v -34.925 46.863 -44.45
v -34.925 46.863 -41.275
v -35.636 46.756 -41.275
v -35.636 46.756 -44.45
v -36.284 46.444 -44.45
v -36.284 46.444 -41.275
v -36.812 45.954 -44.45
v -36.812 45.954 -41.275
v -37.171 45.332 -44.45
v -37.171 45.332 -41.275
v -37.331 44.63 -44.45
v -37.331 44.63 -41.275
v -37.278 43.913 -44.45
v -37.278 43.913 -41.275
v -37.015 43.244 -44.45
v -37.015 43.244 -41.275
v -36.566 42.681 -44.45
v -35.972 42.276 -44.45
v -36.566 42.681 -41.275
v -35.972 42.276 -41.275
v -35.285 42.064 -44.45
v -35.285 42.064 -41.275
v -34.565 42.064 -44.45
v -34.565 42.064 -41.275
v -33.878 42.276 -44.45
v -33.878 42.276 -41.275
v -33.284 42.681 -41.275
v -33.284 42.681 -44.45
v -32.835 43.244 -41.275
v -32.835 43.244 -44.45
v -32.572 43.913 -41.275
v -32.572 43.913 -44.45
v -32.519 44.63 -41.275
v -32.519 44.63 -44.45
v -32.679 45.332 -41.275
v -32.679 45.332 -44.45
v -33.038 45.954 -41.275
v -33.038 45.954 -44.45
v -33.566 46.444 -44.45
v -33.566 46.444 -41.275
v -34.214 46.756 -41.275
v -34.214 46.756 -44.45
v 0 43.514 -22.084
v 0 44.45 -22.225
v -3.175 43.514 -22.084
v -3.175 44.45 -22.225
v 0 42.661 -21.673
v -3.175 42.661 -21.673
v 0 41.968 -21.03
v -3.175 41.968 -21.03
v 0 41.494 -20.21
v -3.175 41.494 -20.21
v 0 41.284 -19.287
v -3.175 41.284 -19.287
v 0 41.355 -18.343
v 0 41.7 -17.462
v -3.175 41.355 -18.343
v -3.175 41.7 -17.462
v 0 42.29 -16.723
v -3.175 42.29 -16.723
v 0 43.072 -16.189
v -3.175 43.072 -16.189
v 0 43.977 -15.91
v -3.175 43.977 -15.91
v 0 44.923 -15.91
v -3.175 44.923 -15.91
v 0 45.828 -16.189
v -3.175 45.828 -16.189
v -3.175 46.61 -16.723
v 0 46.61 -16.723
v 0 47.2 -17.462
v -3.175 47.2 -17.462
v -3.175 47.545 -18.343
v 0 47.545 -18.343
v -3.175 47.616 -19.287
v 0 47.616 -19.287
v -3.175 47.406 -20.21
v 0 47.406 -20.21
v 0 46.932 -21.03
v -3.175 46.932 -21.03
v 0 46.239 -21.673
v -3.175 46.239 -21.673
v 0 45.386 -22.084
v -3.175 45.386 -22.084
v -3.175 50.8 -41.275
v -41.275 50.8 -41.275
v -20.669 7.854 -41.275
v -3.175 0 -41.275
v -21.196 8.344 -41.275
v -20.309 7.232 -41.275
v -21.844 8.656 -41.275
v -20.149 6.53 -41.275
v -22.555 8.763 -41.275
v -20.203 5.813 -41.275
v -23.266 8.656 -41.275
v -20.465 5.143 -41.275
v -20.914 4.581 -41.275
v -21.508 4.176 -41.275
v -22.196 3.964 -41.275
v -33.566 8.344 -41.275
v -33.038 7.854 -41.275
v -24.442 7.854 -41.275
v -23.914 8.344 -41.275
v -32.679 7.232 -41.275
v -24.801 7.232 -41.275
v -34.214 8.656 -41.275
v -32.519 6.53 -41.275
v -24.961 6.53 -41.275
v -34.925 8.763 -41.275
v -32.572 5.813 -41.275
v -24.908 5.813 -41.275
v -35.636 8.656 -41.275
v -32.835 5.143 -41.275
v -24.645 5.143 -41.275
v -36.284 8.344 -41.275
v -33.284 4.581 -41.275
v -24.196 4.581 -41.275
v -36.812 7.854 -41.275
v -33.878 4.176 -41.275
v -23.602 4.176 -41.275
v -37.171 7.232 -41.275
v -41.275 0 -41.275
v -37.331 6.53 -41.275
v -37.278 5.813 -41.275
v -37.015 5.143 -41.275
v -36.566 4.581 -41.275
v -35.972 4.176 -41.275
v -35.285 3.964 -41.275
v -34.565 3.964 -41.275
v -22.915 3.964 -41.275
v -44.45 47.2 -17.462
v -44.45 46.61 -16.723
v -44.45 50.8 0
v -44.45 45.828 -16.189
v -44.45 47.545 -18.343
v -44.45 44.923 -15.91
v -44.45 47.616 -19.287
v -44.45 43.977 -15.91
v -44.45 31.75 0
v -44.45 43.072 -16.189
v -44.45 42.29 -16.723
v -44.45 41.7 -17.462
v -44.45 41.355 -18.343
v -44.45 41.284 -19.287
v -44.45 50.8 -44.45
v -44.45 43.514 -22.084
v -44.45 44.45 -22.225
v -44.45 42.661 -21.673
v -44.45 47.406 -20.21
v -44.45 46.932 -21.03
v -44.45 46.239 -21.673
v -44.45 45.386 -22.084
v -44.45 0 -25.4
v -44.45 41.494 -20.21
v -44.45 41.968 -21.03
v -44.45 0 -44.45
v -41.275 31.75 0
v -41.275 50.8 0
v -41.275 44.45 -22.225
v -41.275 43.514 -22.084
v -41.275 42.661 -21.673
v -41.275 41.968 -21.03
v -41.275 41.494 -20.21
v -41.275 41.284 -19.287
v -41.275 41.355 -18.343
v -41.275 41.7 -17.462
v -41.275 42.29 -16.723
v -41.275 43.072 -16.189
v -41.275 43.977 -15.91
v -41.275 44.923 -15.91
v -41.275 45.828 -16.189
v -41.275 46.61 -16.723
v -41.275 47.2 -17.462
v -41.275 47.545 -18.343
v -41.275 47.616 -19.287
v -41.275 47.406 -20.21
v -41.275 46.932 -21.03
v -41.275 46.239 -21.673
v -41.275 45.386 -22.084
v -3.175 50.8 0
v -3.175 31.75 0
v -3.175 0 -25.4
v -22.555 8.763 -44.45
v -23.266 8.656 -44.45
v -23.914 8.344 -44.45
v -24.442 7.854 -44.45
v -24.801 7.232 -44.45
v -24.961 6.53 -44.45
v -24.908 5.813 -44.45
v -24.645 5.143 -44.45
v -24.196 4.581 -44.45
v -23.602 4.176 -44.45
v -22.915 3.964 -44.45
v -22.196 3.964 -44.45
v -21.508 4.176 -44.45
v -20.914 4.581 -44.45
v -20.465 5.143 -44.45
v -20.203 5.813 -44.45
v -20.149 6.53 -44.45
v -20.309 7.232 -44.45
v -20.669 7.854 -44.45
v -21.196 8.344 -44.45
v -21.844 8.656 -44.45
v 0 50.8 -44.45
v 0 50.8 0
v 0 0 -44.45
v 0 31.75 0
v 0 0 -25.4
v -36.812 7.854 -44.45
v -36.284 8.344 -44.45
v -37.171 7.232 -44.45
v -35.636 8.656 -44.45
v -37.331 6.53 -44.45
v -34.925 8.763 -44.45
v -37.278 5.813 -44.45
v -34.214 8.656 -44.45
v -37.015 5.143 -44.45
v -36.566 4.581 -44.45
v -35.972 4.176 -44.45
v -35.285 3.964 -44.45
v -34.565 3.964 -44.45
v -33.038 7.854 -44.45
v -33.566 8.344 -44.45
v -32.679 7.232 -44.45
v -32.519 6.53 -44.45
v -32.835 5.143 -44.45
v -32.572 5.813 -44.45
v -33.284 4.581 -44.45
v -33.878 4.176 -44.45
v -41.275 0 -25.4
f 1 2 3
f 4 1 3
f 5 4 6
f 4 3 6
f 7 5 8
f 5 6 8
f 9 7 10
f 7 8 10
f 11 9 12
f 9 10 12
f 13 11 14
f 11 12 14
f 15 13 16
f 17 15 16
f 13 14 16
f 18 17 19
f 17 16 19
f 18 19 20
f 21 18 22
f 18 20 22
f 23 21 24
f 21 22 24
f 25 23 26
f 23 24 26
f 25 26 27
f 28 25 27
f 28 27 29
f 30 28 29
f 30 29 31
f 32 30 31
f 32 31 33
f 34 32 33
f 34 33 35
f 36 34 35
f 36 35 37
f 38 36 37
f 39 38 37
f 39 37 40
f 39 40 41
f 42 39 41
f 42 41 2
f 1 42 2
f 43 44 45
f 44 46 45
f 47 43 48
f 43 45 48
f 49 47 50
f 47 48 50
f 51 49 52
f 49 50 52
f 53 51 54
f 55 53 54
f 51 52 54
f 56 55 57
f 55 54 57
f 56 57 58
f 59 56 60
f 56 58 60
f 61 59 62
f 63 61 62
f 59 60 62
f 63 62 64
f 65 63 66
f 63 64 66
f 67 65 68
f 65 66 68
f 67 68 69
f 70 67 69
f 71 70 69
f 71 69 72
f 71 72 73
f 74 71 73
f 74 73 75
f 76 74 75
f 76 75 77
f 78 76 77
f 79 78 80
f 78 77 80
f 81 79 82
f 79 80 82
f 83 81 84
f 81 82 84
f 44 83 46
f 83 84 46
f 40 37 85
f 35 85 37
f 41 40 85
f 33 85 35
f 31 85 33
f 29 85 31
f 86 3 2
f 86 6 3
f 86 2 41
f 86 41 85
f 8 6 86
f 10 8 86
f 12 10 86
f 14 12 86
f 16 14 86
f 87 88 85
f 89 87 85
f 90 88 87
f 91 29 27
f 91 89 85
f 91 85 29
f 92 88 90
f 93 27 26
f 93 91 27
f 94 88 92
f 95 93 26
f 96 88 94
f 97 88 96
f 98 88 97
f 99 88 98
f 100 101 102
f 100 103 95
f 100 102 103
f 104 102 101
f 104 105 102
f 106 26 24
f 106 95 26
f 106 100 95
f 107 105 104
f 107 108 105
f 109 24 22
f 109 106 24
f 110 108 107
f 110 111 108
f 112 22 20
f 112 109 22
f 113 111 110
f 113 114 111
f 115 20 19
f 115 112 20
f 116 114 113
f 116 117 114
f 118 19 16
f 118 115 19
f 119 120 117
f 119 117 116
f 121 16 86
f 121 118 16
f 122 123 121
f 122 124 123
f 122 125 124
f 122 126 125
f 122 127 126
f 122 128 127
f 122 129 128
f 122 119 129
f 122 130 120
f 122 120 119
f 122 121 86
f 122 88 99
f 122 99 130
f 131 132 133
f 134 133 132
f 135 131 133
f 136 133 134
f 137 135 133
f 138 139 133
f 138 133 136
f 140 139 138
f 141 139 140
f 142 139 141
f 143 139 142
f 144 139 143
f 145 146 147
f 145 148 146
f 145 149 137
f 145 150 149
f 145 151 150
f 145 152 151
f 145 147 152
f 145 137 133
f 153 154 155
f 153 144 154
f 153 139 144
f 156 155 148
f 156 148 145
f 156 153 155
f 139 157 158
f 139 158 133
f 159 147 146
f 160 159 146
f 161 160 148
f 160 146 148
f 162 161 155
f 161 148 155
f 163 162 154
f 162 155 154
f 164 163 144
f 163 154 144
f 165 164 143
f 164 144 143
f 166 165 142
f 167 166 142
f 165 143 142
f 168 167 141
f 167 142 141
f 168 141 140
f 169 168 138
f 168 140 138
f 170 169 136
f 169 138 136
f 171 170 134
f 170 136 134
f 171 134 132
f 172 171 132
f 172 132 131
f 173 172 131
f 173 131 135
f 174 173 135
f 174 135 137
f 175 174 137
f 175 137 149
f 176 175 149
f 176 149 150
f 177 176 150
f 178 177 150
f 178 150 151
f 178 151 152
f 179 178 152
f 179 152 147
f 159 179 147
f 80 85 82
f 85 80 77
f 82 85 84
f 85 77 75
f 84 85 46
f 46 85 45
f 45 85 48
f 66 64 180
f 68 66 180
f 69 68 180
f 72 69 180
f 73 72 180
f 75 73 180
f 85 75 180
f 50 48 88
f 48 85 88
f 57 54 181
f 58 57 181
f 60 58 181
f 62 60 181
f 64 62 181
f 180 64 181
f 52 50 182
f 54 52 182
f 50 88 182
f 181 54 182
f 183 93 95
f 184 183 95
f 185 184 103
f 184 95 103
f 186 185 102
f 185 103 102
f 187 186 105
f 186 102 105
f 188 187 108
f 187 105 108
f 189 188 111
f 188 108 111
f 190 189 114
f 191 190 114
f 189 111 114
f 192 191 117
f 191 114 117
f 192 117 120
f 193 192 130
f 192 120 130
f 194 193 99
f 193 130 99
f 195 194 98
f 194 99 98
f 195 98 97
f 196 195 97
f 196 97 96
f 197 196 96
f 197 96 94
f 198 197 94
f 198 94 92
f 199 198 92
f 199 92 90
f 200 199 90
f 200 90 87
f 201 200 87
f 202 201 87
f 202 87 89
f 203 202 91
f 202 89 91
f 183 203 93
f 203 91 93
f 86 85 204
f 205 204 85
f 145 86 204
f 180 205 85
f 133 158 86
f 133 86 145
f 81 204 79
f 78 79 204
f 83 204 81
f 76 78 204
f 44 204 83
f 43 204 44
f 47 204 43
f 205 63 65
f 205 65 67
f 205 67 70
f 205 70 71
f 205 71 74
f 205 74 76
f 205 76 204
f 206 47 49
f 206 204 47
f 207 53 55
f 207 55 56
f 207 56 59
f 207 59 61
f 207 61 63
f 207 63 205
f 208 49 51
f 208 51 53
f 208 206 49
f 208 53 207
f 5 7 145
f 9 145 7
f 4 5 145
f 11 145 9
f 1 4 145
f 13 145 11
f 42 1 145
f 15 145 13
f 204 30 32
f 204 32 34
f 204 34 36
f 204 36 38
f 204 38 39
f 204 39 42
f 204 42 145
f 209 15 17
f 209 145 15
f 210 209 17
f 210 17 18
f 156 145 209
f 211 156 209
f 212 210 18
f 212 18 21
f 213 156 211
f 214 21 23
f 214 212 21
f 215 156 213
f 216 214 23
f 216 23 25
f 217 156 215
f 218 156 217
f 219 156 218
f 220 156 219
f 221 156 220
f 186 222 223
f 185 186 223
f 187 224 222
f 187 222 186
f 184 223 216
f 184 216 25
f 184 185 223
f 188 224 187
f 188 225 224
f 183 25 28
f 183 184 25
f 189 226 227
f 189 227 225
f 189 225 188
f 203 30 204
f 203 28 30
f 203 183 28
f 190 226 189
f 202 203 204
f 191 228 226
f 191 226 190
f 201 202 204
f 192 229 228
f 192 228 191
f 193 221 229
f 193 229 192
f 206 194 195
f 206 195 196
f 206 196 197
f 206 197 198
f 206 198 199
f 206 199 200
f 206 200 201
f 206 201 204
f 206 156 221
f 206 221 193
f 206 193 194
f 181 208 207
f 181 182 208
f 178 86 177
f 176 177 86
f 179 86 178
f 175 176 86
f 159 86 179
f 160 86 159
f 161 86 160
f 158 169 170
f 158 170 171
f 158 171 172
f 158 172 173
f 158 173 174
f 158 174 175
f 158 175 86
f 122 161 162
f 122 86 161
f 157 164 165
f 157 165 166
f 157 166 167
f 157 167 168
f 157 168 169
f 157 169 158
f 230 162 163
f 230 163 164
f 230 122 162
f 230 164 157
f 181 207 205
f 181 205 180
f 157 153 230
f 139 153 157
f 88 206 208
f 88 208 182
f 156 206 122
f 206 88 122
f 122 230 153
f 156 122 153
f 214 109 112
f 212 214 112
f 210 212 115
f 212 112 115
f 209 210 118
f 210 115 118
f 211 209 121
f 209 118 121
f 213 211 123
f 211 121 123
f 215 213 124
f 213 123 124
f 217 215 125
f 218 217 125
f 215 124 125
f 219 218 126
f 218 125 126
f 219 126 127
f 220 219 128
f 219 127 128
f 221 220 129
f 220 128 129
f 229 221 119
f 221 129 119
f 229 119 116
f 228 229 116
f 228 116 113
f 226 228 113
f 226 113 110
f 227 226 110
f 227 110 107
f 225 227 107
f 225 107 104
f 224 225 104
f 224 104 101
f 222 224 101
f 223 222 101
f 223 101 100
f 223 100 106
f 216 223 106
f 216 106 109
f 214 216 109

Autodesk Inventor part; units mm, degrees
ref_plane "YZ Plane" through (0, 0, 0) normal (1, 0, 0) x (0, 1, 0)
ref_plane "XZ Plane" through (0, 0, 0) normal (0, 1, 0) x (-1, 0, 0)
ref_plane "XY Plane" through (0, 0, 0) normal (0, 0, 1) x (1, 0, 0)
sketch "Sketch1" plane through (0, 0, 0) normal (0, 1, 0) x (-1, 0, 0)
  line L0 (0, 0) -> (44.45, 0)
  line L1 (44.45, 0) -> (44.45, -44.45)
  line L2 (44.45, -44.45) -> (0, -44.45)
  line L3 (0, -44.45) -> (0, 0)
  line L4 (41.275, -41.275) -> (41.275, -3.175)
  line L5 (41.275, -3.175) -> (3.175, -3.175)
  line L6 (3.175, -3.175) -> (3.175, -41.275)
  line L7 (3.175, -41.275) -> (41.275, -41.275)
  line L8 (41.275, -3.175) -> (41.275, 0)
  line L9 (3.175, -3.175) -> (3.175, 0)
  dimension "d0" = 3.175
  dimension "d1" = 44.45
extrude "Extrusion1" add sketch "Sketch1" along normal blind 50.8 contours L0 L9 L6 L7 L4 L8 L1 L2 L3
sketch "Sketch2" plane through (0, 0, 0) normal (1, 0, 0) x (0, 0, -1)
  line L0 (0, 50.8) -> (44.45, 50.8) projected
  line L1 (0, 0) -> (0, 50.8) projected
  line L2 (44.45, 0) -> (44.45, 50.8) projected
  point P0 (19.05, 44.45)
  dimension "d11" = 6.35
  dimension "d13" = 25.4
hole "Hole1" at (0, 44.45, -19.05) direction (-1, 0, 0) diameter 6.35 end through all
sketch "Sketch3" plane through (0, 0, -44.45) normal (0, 0, -1) x (-1, 0, 0)
  line L0 (16.2052, 86.1658) -> (16.2052, -32.4239) construction
  line L1 (0, 0) -> (0, 50.8) construction
  line L2 (44.45, 0) -> (44.45, 50.8) construction
  line L3 (0, 50.8) -> (44.45, 50.8) construction
  line L4 (0, 0) -> (44.45, 0) projected
  point P0 (34.925, 44.45)
  point P1 (34.925, 6.35)
  point P2 (22.5552, 6.35)
  point P3 (22.5552, 44.45)
  dimension "d14" = 16.2052
  dimension "d17" = 6.35
  dimension "d18" = 6.35
  dimension "d19" = 6.35
  dimension "d30" = 6.35
  dimension "d31" = 9.525
  dimension "d32" = 9.525
  dimension "d33" = 6.35
  dimension "d34" = 6.35
hole "Hole2" at (-34.925, 44.45, -44.45) at (-34.925, 6.35, -44.45) at (-22.5552, 6.35, -44.45) direction (0, 0, 1) diameter 4.826 end through all
sketch "Sketch4" plane through (-44.45, 0, -44.45) normal (-1, 0, 0) x (0, 0, 1)
  line L0 (19.05, 0) -> (44.45, 31.75)
  circle A0 centre (25.4, 44.45) radius 3.175 projected
  line L1 (0, 0) -> (44.45, 0) projected
  line L2 (44.45, 0) -> (44.45, 50.8) projected
  line L3 (0, 50.8) -> (44.45, 50.8) projected
  line L4 (0, 0) -> (0, 50.8) projected
  point P0 (44.45, 0)
  dimension "d35" = 19.05
  dimension "d36" = 25.4
extrude "Extrusion2" cut sketch "Sketch4" against normal blind 152.4 contours L0 L2 L1
equation "\"d18\" = d17"
equation "\"d19\" = d18"
equation "\"d30\" = d17"
equation "\"d32\" = d31"
equation "\"d34\" = d33"
properties part number "CAR_016_TensionerMount" material "Aluminum 6061"
